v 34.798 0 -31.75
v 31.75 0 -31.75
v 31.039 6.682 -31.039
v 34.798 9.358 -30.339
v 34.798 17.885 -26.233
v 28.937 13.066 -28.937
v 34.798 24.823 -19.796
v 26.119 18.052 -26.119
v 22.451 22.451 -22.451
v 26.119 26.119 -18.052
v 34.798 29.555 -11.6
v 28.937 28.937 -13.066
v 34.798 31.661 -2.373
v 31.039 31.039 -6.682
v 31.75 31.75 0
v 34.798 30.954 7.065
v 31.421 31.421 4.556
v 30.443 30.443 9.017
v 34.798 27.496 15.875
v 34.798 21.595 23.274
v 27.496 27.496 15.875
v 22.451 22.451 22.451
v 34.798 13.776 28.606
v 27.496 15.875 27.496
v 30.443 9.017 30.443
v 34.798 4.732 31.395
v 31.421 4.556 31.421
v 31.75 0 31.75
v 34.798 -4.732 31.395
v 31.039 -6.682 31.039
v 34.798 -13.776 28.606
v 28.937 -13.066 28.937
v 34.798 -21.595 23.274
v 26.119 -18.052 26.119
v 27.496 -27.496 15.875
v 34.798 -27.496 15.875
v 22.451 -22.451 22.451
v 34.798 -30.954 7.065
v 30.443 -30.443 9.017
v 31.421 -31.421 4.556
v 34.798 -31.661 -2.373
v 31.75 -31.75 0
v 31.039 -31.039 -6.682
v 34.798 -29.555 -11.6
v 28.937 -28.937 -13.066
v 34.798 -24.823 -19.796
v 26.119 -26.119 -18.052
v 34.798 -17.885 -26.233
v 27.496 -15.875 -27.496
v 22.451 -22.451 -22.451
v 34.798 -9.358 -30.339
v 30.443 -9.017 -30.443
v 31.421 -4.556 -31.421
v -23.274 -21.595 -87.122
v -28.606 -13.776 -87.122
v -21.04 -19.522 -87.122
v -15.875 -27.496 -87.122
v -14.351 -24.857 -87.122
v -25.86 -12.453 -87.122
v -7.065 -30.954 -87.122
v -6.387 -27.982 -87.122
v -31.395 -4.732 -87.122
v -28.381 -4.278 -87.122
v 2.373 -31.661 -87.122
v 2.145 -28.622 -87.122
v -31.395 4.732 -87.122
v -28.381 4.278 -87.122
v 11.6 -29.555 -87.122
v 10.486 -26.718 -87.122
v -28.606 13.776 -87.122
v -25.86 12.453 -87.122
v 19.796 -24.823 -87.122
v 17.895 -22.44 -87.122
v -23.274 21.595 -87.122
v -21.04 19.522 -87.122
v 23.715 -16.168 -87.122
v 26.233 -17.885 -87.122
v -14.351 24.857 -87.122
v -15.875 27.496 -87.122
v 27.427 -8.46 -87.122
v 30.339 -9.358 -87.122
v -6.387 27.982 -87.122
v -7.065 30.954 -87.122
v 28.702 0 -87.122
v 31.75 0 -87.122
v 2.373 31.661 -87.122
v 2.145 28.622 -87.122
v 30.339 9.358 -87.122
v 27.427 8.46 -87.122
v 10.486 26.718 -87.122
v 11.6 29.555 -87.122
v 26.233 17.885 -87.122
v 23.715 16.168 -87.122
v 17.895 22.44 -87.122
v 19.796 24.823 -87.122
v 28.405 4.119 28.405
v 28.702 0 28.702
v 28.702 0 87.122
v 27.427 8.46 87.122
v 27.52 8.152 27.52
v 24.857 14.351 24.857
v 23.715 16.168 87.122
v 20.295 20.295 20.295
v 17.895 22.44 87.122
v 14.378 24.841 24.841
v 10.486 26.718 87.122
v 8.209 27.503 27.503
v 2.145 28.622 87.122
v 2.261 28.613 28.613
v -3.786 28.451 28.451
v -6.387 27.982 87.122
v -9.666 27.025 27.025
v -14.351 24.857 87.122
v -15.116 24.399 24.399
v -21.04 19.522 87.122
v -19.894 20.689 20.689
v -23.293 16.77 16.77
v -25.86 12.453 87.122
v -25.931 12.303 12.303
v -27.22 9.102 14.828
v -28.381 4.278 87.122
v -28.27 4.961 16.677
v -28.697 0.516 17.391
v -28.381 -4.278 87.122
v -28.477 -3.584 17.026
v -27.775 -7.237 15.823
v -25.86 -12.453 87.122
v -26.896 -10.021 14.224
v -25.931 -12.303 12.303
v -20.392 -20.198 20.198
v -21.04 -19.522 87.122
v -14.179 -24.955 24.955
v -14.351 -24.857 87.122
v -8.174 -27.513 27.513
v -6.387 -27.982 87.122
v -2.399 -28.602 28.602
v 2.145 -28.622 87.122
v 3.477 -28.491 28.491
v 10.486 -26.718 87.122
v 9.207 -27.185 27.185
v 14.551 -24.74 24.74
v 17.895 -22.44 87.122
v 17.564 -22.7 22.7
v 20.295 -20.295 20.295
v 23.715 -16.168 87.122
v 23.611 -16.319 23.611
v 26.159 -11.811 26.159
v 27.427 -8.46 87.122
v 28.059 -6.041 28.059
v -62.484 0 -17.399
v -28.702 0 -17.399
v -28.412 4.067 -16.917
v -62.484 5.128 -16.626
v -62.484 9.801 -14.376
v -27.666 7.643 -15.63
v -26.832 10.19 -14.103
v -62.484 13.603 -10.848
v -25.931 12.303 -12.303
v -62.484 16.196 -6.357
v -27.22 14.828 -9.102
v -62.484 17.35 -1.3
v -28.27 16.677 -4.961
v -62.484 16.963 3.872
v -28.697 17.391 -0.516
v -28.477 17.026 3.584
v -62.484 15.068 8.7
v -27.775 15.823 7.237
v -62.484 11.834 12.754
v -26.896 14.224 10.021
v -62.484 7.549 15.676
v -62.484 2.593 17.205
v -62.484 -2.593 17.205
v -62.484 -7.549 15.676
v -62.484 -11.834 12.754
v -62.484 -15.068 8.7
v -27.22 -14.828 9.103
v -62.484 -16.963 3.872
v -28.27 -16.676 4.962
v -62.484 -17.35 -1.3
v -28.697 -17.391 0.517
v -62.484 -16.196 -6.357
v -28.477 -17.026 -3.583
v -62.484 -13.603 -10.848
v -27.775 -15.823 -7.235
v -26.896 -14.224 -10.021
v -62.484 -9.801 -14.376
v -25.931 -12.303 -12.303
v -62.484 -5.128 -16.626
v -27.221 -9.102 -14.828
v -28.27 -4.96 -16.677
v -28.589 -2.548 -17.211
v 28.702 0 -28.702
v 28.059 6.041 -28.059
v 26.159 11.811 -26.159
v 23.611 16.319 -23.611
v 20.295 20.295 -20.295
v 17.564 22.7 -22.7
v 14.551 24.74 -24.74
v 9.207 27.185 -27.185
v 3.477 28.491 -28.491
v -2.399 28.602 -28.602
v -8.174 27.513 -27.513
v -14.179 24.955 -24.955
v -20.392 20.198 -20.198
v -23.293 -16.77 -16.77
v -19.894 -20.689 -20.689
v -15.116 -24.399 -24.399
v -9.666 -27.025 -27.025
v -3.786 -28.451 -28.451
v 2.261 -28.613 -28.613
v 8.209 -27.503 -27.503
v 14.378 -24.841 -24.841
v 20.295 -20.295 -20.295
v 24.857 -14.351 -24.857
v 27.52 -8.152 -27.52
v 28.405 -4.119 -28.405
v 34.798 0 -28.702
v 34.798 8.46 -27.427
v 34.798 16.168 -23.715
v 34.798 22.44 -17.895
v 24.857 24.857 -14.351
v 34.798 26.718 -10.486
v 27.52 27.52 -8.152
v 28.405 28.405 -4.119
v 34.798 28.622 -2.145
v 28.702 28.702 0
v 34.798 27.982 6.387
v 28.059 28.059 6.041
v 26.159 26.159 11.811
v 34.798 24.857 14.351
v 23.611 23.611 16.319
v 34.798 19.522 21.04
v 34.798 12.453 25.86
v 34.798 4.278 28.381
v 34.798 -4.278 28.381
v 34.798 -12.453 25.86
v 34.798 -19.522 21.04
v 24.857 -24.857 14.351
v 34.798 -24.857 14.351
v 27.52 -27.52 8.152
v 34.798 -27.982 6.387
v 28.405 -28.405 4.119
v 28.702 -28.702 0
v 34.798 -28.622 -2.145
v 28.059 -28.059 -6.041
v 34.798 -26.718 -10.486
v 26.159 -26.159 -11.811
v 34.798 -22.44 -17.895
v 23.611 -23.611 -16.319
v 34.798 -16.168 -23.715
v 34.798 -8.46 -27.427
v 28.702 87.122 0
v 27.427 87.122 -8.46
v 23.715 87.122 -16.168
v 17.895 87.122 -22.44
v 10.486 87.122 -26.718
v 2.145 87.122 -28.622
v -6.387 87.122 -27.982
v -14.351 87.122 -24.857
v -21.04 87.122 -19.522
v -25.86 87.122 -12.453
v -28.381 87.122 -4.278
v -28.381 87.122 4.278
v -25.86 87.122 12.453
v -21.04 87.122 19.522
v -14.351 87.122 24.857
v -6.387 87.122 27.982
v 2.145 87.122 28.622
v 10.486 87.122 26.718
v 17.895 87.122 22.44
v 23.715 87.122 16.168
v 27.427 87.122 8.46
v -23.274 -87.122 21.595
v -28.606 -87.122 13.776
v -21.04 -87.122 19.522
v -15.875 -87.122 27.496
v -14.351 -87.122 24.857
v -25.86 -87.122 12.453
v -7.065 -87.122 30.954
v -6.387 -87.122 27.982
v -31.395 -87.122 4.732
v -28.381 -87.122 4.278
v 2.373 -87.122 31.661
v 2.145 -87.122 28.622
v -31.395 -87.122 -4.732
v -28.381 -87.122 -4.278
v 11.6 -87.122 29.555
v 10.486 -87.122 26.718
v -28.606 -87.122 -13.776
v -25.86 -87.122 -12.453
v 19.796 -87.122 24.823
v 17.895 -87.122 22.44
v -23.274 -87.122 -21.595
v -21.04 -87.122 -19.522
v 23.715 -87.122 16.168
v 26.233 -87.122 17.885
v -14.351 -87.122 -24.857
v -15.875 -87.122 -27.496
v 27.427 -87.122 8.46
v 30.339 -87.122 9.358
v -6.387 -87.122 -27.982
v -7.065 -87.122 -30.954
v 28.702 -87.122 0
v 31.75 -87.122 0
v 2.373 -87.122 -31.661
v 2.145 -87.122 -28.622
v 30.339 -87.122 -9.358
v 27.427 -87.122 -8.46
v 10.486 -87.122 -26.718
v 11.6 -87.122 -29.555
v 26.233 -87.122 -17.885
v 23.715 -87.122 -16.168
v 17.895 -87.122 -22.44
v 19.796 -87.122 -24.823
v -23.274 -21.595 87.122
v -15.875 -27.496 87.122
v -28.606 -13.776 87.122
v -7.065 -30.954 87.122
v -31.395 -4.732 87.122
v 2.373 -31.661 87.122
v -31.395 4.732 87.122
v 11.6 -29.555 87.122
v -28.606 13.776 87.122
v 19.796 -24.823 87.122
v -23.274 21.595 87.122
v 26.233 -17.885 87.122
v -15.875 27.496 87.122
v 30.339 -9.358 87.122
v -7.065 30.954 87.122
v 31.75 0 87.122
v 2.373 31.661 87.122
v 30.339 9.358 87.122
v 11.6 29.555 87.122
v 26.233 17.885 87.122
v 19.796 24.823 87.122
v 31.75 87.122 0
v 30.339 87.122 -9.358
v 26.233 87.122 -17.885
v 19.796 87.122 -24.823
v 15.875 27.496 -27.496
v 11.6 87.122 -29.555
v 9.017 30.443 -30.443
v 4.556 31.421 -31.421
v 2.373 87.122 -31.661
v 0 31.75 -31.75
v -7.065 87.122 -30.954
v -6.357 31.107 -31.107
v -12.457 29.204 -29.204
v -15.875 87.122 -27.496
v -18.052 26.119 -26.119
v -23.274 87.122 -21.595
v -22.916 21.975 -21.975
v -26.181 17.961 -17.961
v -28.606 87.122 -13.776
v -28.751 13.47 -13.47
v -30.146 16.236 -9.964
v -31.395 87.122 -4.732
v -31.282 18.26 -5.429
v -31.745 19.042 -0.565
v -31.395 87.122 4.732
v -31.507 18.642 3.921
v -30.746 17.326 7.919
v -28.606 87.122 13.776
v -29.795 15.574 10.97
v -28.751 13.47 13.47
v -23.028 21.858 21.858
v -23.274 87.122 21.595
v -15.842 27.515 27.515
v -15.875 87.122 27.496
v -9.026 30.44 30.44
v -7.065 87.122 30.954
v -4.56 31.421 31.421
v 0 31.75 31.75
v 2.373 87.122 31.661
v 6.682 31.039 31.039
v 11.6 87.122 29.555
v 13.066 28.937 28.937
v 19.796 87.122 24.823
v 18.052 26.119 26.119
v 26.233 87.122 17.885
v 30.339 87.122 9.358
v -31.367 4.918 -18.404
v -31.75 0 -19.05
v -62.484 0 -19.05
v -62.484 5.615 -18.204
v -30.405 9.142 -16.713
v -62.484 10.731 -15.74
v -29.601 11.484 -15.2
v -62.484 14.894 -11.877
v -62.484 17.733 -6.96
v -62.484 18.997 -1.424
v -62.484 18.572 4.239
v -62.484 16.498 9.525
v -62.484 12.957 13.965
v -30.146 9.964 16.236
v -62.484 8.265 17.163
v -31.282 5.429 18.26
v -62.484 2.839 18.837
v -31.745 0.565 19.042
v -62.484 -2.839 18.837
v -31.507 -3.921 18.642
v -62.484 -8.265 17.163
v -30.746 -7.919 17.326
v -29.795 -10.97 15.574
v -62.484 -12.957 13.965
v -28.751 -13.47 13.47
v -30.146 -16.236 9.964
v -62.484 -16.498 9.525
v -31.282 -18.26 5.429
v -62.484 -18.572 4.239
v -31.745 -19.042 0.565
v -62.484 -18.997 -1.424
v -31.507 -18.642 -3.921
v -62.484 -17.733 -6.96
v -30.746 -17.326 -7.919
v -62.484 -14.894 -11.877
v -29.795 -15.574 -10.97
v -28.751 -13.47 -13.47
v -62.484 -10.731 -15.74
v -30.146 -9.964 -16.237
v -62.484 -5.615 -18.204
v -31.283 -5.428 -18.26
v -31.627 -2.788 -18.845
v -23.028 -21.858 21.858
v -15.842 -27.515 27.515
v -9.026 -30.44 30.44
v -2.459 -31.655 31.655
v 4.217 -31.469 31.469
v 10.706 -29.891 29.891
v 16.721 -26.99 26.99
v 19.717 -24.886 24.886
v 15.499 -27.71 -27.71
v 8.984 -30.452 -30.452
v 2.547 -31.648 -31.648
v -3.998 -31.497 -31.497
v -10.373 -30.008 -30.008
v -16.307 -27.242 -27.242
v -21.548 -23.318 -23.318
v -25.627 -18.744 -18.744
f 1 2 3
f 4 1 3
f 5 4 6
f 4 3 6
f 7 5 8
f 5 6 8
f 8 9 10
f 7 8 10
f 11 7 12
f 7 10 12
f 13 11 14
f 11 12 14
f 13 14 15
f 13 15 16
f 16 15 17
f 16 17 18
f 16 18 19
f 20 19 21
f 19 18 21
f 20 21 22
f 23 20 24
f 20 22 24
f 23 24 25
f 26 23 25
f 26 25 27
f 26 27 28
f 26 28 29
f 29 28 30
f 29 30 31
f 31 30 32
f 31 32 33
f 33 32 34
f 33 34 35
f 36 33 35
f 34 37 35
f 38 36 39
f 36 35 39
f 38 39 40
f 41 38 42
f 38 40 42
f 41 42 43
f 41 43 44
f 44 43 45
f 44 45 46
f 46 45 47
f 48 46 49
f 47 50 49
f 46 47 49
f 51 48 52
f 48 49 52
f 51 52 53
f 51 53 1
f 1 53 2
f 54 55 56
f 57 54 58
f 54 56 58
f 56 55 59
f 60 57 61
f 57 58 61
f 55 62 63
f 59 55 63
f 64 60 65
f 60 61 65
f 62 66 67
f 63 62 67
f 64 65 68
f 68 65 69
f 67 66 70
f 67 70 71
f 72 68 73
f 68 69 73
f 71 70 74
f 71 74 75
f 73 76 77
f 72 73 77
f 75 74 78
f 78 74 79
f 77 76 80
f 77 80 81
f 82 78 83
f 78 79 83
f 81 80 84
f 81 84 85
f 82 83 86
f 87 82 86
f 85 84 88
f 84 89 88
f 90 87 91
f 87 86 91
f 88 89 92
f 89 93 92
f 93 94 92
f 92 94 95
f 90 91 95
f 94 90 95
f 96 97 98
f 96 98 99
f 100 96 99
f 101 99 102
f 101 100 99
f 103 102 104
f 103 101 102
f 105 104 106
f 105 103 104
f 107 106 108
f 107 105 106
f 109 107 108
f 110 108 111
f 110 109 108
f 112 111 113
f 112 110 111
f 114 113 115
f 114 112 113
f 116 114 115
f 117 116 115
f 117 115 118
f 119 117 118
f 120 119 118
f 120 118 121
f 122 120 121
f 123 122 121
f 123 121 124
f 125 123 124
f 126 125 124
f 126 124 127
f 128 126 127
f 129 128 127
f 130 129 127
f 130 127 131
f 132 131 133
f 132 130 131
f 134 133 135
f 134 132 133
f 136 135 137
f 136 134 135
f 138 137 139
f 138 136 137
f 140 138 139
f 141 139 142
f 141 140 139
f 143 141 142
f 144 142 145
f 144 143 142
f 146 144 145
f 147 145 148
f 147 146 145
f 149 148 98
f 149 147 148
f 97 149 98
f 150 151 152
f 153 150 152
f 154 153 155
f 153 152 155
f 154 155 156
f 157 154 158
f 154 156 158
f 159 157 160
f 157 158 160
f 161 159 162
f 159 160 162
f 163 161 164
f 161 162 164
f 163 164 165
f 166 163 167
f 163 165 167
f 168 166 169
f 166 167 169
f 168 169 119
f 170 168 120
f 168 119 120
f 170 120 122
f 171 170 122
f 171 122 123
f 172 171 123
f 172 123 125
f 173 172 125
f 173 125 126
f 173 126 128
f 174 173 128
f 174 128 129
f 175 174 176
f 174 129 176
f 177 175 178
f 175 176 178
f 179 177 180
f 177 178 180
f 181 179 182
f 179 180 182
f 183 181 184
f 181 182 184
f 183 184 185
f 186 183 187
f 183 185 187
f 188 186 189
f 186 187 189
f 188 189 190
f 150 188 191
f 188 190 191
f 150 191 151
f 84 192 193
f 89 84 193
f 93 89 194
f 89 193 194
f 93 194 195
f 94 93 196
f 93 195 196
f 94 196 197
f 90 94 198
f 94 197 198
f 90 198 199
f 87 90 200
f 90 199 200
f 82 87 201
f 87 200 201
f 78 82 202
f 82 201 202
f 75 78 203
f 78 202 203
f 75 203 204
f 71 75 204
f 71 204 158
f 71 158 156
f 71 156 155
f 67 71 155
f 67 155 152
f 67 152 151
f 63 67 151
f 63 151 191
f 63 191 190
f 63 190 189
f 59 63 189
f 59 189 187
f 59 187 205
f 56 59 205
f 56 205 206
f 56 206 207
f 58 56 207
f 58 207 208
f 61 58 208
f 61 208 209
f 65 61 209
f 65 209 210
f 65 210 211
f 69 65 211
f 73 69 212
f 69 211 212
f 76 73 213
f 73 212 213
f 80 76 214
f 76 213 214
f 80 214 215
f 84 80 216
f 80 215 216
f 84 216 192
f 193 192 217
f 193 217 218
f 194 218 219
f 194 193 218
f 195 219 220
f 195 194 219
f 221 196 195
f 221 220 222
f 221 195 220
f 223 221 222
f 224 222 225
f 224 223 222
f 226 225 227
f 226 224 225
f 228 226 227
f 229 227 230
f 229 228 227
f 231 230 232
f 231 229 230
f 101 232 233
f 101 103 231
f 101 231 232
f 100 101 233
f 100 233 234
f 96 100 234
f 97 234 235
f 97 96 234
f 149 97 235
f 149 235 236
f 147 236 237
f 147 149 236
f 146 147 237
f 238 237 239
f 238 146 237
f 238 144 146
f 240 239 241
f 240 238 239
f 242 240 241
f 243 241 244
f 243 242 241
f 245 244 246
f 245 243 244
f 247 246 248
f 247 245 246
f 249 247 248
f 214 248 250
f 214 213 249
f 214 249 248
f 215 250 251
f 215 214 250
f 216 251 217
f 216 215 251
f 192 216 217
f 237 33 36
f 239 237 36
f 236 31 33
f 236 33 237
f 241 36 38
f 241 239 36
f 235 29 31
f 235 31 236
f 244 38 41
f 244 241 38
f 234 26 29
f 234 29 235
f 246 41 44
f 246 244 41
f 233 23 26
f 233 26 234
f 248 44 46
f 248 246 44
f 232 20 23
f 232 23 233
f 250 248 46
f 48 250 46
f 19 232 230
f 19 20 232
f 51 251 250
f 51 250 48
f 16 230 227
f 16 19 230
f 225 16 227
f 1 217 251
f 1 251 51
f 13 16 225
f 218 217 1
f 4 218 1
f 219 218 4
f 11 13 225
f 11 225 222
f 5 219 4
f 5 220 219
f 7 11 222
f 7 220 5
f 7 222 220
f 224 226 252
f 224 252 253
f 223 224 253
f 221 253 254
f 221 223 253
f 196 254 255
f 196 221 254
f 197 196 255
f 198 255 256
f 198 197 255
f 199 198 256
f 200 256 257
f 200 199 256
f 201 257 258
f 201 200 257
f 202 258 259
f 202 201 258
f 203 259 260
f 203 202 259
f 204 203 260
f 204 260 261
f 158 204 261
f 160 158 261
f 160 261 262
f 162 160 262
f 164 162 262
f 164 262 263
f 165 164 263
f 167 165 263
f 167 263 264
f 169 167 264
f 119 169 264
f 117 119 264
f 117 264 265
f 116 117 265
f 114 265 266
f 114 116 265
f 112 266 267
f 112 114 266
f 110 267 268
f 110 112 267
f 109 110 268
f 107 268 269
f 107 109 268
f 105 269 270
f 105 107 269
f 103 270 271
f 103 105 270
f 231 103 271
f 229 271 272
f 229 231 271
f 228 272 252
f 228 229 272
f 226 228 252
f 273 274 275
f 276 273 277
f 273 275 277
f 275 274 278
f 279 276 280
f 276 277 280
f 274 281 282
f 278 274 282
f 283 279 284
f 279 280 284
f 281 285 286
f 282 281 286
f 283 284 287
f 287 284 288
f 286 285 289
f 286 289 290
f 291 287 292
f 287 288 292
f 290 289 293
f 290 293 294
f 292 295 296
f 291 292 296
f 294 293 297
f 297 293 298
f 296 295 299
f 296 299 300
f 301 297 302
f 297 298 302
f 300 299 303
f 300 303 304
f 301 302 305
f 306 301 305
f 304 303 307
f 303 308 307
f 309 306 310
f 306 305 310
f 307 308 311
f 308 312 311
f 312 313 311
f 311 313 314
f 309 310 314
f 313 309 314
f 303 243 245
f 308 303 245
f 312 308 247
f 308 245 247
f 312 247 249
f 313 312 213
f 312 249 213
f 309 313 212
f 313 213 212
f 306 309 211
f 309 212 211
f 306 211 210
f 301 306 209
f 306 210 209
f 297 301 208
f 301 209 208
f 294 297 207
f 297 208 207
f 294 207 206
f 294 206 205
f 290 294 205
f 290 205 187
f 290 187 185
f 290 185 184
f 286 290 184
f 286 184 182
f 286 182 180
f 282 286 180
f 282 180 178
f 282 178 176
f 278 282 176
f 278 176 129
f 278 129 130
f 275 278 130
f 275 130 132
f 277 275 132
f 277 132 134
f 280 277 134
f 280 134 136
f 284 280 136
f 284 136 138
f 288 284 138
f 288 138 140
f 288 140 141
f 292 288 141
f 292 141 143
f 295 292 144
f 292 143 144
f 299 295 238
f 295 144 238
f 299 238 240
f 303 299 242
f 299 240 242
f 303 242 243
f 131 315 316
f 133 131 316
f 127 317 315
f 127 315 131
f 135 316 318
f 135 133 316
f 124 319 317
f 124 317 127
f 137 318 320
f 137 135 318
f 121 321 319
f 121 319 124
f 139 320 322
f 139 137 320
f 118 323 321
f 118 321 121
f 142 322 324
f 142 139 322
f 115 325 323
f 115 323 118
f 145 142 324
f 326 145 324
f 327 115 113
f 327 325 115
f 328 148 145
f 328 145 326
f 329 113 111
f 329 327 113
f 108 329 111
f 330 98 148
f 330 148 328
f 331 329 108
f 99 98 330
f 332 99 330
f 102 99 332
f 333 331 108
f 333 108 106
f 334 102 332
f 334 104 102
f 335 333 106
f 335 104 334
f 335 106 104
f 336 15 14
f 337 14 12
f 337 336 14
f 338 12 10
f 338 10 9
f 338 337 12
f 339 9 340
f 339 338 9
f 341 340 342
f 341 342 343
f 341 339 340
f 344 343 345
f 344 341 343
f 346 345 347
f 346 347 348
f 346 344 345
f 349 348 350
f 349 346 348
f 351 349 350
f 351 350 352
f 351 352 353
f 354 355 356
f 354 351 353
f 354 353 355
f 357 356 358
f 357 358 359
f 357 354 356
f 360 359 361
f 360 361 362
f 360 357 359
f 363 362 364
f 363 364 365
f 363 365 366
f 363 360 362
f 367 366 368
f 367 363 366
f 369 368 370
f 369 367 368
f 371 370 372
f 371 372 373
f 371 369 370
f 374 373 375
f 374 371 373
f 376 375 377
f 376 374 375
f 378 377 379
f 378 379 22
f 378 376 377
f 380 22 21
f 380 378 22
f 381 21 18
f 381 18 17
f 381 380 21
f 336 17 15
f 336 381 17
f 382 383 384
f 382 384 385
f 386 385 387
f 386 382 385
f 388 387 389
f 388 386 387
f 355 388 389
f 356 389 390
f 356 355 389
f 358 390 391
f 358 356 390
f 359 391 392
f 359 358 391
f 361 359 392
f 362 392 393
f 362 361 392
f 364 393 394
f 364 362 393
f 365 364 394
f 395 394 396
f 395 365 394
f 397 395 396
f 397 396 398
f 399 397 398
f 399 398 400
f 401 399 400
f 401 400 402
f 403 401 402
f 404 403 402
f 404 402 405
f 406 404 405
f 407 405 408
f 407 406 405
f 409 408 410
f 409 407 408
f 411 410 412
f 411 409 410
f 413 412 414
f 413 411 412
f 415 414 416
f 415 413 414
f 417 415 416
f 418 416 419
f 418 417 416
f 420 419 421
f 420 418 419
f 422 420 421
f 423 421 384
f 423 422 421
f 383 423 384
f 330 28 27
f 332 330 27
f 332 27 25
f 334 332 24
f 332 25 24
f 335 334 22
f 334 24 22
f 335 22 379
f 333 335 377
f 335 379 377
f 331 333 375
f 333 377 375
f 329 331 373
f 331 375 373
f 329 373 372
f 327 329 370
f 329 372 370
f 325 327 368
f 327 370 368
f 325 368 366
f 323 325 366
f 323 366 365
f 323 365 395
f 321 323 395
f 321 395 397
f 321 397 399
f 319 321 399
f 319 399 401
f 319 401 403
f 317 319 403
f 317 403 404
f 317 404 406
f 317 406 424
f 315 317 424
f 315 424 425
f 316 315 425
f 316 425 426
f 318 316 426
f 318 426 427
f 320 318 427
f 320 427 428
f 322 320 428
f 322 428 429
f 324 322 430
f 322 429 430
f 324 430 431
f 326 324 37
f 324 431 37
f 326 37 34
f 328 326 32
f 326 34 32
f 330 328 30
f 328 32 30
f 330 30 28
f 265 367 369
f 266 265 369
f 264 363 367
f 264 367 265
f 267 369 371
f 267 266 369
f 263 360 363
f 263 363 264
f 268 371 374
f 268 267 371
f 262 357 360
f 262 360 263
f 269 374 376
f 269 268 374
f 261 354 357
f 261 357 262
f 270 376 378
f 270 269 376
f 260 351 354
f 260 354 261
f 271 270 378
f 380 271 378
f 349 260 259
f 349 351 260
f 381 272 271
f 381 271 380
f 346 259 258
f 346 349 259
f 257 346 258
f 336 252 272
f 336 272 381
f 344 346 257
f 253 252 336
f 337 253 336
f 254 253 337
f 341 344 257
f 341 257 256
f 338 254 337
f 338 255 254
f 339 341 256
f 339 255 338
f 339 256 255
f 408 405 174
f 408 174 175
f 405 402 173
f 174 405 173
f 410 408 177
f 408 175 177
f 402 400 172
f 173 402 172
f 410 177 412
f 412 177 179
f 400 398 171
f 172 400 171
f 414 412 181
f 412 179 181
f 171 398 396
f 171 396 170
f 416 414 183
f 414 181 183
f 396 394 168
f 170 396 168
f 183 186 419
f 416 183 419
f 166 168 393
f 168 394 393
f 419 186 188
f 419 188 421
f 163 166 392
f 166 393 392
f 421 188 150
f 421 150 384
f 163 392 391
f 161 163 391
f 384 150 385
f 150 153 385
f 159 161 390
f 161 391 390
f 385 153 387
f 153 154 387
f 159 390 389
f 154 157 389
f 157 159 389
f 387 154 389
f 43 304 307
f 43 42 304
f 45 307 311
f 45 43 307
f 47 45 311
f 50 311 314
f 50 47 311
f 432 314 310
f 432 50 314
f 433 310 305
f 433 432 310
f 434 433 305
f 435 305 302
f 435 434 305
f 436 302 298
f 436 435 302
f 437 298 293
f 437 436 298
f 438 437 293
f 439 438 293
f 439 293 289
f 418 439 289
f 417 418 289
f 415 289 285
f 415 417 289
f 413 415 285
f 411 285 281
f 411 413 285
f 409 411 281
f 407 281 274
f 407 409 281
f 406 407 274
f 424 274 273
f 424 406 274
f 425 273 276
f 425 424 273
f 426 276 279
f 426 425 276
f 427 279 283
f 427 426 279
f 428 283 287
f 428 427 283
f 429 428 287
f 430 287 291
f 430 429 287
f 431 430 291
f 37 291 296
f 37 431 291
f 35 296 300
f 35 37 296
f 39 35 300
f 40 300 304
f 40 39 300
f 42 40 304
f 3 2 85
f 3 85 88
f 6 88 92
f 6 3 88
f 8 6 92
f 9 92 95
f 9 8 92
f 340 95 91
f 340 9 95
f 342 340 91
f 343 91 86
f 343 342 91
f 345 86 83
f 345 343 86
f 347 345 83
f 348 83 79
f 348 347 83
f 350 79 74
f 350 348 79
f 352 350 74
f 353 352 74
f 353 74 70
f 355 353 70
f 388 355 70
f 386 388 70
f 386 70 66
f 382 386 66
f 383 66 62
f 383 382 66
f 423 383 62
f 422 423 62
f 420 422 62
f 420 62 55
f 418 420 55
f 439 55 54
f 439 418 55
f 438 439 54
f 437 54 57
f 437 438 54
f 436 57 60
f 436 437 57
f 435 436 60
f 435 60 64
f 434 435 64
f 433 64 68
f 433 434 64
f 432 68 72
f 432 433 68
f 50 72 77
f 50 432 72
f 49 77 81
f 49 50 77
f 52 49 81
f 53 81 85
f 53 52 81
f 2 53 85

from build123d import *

# Parameters (mm, degrees)
SKETCH1_R               = 31.75
EXTRUDE3_DEPTH          = 87.122
EXTRUDE3_DEPTH_BACK     = 87.122
SKETCH4_R               = 31.75
EXTRUDE4_DEPTH          = 87.122
EXTRUDE4_DEPTH_BACK     = 87.122
SKETCH6_R               = 31.75
EXTRUDE5_DEPTH          = 34.798
SKETCH7_R               = 19.05
EXTRUDE6_DEPTH          = 62.484
SKETCH9_R               = 28.702
CUT_EXTRUDE1_DEPTH      = 88.1220001
CUT_EXTRUDE1_DEPTH_BACK = 88.1220001
SKETCH10_R              = 28.702
CUT_EXTRUDE2_DEPTH      = 88.1220001
CUT_EXTRUDE2_DEPTH_BACK = 88.1220001
SKETCH11_R              = 28.702
CUT_EXTRUDE3_DEPTH      = 35.798
SKETCH12_R              = 17.399
CUT_EXTRUDE4_DEPTH      = 63.4840001


with BuildPart() as part:
    # Sketch1 → Extrude3 (new body, two sides)
    with BuildSketch(Plane(origin=(0, 0, 0), x_dir=(1, 0, 0), z_dir=(0, 1, 0))) as extrude3_sk:
        Circle(SKETCH1_R)
    extrude(amount=EXTRUDE3_DEPTH)
    extrude(extrude3_sk.sketch, amount=-EXTRUDE3_DEPTH_BACK)

    # Sketch4 → Extrude4 (add, two sides)
    with BuildSketch(Plane.XY) as extrude4_sk:
        Circle(SKETCH4_R)
    extrude(amount=EXTRUDE4_DEPTH)
    extrude(extrude4_sk.sketch, amount=-EXTRUDE4_DEPTH_BACK)

    # Sketch6 → Extrude5 (add)
    with BuildSketch(Plane(origin=(0, 0, 0), x_dir=(0, 0, -1), z_dir=(1, 0, 0))):
        Circle(SKETCH6_R)
    extrude(amount=EXTRUDE5_DEPTH)

    # Sketch7 → Extrude6 (add)
    with BuildSketch(Plane(origin=(0, 0, 0), x_dir=(0, 0, -1), z_dir=(1, 0, 0))):
        Circle(SKETCH7_R)
    extrude(amount=-EXTRUDE6_DEPTH)

    # Sketch9 → Cut-Extrude1 (cut, two sides)
    with BuildSketch(Plane(origin=(0, 0, 0), x_dir=(1, 0, 0), z_dir=(0, 1, 0))) as cut_extrude1_sk:
        Circle(SKETCH9_R)
    extrude(amount=CUT_EXTRUDE1_DEPTH, mode=Mode.SUBTRACT)
    extrude(cut_extrude1_sk.sketch, amount=-CUT_EXTRUDE1_DEPTH_BACK, mode=Mode.SUBTRACT)

    # Sketch10 → Cut-Extrude2 (cut, two sides)
    with BuildSketch(Plane.XY) as cut_extrude2_sk:
        Circle(SKETCH10_R)
    extrude(amount=CUT_EXTRUDE2_DEPTH, mode=Mode.SUBTRACT)
    extrude(cut_extrude2_sk.sketch, amount=-CUT_EXTRUDE2_DEPTH_BACK, mode=Mode.SUBTRACT)

    # Sketch11 → Cut-Extrude3 (cut, through all)
    with BuildSketch(Plane(origin=(0, 0, 0), x_dir=(0, 0, -1), z_dir=(1, 0, 0))):
        Circle(SKETCH11_R)
    extrude(amount=CUT_EXTRUDE3_DEPTH, mode=Mode.SUBTRACT)

    # Sketch12 → Cut-Extrude4 (cut, through all)
    with BuildSketch(Plane(origin=(0, 0, 0), x_dir=(0, 0, -1), z_dir=(1, 0, 0))):
        Circle(SKETCH12_R)
    extrude(amount=-CUT_EXTRUDE4_DEPTH, mode=Mode.SUBTRACT)


solid = part.part
